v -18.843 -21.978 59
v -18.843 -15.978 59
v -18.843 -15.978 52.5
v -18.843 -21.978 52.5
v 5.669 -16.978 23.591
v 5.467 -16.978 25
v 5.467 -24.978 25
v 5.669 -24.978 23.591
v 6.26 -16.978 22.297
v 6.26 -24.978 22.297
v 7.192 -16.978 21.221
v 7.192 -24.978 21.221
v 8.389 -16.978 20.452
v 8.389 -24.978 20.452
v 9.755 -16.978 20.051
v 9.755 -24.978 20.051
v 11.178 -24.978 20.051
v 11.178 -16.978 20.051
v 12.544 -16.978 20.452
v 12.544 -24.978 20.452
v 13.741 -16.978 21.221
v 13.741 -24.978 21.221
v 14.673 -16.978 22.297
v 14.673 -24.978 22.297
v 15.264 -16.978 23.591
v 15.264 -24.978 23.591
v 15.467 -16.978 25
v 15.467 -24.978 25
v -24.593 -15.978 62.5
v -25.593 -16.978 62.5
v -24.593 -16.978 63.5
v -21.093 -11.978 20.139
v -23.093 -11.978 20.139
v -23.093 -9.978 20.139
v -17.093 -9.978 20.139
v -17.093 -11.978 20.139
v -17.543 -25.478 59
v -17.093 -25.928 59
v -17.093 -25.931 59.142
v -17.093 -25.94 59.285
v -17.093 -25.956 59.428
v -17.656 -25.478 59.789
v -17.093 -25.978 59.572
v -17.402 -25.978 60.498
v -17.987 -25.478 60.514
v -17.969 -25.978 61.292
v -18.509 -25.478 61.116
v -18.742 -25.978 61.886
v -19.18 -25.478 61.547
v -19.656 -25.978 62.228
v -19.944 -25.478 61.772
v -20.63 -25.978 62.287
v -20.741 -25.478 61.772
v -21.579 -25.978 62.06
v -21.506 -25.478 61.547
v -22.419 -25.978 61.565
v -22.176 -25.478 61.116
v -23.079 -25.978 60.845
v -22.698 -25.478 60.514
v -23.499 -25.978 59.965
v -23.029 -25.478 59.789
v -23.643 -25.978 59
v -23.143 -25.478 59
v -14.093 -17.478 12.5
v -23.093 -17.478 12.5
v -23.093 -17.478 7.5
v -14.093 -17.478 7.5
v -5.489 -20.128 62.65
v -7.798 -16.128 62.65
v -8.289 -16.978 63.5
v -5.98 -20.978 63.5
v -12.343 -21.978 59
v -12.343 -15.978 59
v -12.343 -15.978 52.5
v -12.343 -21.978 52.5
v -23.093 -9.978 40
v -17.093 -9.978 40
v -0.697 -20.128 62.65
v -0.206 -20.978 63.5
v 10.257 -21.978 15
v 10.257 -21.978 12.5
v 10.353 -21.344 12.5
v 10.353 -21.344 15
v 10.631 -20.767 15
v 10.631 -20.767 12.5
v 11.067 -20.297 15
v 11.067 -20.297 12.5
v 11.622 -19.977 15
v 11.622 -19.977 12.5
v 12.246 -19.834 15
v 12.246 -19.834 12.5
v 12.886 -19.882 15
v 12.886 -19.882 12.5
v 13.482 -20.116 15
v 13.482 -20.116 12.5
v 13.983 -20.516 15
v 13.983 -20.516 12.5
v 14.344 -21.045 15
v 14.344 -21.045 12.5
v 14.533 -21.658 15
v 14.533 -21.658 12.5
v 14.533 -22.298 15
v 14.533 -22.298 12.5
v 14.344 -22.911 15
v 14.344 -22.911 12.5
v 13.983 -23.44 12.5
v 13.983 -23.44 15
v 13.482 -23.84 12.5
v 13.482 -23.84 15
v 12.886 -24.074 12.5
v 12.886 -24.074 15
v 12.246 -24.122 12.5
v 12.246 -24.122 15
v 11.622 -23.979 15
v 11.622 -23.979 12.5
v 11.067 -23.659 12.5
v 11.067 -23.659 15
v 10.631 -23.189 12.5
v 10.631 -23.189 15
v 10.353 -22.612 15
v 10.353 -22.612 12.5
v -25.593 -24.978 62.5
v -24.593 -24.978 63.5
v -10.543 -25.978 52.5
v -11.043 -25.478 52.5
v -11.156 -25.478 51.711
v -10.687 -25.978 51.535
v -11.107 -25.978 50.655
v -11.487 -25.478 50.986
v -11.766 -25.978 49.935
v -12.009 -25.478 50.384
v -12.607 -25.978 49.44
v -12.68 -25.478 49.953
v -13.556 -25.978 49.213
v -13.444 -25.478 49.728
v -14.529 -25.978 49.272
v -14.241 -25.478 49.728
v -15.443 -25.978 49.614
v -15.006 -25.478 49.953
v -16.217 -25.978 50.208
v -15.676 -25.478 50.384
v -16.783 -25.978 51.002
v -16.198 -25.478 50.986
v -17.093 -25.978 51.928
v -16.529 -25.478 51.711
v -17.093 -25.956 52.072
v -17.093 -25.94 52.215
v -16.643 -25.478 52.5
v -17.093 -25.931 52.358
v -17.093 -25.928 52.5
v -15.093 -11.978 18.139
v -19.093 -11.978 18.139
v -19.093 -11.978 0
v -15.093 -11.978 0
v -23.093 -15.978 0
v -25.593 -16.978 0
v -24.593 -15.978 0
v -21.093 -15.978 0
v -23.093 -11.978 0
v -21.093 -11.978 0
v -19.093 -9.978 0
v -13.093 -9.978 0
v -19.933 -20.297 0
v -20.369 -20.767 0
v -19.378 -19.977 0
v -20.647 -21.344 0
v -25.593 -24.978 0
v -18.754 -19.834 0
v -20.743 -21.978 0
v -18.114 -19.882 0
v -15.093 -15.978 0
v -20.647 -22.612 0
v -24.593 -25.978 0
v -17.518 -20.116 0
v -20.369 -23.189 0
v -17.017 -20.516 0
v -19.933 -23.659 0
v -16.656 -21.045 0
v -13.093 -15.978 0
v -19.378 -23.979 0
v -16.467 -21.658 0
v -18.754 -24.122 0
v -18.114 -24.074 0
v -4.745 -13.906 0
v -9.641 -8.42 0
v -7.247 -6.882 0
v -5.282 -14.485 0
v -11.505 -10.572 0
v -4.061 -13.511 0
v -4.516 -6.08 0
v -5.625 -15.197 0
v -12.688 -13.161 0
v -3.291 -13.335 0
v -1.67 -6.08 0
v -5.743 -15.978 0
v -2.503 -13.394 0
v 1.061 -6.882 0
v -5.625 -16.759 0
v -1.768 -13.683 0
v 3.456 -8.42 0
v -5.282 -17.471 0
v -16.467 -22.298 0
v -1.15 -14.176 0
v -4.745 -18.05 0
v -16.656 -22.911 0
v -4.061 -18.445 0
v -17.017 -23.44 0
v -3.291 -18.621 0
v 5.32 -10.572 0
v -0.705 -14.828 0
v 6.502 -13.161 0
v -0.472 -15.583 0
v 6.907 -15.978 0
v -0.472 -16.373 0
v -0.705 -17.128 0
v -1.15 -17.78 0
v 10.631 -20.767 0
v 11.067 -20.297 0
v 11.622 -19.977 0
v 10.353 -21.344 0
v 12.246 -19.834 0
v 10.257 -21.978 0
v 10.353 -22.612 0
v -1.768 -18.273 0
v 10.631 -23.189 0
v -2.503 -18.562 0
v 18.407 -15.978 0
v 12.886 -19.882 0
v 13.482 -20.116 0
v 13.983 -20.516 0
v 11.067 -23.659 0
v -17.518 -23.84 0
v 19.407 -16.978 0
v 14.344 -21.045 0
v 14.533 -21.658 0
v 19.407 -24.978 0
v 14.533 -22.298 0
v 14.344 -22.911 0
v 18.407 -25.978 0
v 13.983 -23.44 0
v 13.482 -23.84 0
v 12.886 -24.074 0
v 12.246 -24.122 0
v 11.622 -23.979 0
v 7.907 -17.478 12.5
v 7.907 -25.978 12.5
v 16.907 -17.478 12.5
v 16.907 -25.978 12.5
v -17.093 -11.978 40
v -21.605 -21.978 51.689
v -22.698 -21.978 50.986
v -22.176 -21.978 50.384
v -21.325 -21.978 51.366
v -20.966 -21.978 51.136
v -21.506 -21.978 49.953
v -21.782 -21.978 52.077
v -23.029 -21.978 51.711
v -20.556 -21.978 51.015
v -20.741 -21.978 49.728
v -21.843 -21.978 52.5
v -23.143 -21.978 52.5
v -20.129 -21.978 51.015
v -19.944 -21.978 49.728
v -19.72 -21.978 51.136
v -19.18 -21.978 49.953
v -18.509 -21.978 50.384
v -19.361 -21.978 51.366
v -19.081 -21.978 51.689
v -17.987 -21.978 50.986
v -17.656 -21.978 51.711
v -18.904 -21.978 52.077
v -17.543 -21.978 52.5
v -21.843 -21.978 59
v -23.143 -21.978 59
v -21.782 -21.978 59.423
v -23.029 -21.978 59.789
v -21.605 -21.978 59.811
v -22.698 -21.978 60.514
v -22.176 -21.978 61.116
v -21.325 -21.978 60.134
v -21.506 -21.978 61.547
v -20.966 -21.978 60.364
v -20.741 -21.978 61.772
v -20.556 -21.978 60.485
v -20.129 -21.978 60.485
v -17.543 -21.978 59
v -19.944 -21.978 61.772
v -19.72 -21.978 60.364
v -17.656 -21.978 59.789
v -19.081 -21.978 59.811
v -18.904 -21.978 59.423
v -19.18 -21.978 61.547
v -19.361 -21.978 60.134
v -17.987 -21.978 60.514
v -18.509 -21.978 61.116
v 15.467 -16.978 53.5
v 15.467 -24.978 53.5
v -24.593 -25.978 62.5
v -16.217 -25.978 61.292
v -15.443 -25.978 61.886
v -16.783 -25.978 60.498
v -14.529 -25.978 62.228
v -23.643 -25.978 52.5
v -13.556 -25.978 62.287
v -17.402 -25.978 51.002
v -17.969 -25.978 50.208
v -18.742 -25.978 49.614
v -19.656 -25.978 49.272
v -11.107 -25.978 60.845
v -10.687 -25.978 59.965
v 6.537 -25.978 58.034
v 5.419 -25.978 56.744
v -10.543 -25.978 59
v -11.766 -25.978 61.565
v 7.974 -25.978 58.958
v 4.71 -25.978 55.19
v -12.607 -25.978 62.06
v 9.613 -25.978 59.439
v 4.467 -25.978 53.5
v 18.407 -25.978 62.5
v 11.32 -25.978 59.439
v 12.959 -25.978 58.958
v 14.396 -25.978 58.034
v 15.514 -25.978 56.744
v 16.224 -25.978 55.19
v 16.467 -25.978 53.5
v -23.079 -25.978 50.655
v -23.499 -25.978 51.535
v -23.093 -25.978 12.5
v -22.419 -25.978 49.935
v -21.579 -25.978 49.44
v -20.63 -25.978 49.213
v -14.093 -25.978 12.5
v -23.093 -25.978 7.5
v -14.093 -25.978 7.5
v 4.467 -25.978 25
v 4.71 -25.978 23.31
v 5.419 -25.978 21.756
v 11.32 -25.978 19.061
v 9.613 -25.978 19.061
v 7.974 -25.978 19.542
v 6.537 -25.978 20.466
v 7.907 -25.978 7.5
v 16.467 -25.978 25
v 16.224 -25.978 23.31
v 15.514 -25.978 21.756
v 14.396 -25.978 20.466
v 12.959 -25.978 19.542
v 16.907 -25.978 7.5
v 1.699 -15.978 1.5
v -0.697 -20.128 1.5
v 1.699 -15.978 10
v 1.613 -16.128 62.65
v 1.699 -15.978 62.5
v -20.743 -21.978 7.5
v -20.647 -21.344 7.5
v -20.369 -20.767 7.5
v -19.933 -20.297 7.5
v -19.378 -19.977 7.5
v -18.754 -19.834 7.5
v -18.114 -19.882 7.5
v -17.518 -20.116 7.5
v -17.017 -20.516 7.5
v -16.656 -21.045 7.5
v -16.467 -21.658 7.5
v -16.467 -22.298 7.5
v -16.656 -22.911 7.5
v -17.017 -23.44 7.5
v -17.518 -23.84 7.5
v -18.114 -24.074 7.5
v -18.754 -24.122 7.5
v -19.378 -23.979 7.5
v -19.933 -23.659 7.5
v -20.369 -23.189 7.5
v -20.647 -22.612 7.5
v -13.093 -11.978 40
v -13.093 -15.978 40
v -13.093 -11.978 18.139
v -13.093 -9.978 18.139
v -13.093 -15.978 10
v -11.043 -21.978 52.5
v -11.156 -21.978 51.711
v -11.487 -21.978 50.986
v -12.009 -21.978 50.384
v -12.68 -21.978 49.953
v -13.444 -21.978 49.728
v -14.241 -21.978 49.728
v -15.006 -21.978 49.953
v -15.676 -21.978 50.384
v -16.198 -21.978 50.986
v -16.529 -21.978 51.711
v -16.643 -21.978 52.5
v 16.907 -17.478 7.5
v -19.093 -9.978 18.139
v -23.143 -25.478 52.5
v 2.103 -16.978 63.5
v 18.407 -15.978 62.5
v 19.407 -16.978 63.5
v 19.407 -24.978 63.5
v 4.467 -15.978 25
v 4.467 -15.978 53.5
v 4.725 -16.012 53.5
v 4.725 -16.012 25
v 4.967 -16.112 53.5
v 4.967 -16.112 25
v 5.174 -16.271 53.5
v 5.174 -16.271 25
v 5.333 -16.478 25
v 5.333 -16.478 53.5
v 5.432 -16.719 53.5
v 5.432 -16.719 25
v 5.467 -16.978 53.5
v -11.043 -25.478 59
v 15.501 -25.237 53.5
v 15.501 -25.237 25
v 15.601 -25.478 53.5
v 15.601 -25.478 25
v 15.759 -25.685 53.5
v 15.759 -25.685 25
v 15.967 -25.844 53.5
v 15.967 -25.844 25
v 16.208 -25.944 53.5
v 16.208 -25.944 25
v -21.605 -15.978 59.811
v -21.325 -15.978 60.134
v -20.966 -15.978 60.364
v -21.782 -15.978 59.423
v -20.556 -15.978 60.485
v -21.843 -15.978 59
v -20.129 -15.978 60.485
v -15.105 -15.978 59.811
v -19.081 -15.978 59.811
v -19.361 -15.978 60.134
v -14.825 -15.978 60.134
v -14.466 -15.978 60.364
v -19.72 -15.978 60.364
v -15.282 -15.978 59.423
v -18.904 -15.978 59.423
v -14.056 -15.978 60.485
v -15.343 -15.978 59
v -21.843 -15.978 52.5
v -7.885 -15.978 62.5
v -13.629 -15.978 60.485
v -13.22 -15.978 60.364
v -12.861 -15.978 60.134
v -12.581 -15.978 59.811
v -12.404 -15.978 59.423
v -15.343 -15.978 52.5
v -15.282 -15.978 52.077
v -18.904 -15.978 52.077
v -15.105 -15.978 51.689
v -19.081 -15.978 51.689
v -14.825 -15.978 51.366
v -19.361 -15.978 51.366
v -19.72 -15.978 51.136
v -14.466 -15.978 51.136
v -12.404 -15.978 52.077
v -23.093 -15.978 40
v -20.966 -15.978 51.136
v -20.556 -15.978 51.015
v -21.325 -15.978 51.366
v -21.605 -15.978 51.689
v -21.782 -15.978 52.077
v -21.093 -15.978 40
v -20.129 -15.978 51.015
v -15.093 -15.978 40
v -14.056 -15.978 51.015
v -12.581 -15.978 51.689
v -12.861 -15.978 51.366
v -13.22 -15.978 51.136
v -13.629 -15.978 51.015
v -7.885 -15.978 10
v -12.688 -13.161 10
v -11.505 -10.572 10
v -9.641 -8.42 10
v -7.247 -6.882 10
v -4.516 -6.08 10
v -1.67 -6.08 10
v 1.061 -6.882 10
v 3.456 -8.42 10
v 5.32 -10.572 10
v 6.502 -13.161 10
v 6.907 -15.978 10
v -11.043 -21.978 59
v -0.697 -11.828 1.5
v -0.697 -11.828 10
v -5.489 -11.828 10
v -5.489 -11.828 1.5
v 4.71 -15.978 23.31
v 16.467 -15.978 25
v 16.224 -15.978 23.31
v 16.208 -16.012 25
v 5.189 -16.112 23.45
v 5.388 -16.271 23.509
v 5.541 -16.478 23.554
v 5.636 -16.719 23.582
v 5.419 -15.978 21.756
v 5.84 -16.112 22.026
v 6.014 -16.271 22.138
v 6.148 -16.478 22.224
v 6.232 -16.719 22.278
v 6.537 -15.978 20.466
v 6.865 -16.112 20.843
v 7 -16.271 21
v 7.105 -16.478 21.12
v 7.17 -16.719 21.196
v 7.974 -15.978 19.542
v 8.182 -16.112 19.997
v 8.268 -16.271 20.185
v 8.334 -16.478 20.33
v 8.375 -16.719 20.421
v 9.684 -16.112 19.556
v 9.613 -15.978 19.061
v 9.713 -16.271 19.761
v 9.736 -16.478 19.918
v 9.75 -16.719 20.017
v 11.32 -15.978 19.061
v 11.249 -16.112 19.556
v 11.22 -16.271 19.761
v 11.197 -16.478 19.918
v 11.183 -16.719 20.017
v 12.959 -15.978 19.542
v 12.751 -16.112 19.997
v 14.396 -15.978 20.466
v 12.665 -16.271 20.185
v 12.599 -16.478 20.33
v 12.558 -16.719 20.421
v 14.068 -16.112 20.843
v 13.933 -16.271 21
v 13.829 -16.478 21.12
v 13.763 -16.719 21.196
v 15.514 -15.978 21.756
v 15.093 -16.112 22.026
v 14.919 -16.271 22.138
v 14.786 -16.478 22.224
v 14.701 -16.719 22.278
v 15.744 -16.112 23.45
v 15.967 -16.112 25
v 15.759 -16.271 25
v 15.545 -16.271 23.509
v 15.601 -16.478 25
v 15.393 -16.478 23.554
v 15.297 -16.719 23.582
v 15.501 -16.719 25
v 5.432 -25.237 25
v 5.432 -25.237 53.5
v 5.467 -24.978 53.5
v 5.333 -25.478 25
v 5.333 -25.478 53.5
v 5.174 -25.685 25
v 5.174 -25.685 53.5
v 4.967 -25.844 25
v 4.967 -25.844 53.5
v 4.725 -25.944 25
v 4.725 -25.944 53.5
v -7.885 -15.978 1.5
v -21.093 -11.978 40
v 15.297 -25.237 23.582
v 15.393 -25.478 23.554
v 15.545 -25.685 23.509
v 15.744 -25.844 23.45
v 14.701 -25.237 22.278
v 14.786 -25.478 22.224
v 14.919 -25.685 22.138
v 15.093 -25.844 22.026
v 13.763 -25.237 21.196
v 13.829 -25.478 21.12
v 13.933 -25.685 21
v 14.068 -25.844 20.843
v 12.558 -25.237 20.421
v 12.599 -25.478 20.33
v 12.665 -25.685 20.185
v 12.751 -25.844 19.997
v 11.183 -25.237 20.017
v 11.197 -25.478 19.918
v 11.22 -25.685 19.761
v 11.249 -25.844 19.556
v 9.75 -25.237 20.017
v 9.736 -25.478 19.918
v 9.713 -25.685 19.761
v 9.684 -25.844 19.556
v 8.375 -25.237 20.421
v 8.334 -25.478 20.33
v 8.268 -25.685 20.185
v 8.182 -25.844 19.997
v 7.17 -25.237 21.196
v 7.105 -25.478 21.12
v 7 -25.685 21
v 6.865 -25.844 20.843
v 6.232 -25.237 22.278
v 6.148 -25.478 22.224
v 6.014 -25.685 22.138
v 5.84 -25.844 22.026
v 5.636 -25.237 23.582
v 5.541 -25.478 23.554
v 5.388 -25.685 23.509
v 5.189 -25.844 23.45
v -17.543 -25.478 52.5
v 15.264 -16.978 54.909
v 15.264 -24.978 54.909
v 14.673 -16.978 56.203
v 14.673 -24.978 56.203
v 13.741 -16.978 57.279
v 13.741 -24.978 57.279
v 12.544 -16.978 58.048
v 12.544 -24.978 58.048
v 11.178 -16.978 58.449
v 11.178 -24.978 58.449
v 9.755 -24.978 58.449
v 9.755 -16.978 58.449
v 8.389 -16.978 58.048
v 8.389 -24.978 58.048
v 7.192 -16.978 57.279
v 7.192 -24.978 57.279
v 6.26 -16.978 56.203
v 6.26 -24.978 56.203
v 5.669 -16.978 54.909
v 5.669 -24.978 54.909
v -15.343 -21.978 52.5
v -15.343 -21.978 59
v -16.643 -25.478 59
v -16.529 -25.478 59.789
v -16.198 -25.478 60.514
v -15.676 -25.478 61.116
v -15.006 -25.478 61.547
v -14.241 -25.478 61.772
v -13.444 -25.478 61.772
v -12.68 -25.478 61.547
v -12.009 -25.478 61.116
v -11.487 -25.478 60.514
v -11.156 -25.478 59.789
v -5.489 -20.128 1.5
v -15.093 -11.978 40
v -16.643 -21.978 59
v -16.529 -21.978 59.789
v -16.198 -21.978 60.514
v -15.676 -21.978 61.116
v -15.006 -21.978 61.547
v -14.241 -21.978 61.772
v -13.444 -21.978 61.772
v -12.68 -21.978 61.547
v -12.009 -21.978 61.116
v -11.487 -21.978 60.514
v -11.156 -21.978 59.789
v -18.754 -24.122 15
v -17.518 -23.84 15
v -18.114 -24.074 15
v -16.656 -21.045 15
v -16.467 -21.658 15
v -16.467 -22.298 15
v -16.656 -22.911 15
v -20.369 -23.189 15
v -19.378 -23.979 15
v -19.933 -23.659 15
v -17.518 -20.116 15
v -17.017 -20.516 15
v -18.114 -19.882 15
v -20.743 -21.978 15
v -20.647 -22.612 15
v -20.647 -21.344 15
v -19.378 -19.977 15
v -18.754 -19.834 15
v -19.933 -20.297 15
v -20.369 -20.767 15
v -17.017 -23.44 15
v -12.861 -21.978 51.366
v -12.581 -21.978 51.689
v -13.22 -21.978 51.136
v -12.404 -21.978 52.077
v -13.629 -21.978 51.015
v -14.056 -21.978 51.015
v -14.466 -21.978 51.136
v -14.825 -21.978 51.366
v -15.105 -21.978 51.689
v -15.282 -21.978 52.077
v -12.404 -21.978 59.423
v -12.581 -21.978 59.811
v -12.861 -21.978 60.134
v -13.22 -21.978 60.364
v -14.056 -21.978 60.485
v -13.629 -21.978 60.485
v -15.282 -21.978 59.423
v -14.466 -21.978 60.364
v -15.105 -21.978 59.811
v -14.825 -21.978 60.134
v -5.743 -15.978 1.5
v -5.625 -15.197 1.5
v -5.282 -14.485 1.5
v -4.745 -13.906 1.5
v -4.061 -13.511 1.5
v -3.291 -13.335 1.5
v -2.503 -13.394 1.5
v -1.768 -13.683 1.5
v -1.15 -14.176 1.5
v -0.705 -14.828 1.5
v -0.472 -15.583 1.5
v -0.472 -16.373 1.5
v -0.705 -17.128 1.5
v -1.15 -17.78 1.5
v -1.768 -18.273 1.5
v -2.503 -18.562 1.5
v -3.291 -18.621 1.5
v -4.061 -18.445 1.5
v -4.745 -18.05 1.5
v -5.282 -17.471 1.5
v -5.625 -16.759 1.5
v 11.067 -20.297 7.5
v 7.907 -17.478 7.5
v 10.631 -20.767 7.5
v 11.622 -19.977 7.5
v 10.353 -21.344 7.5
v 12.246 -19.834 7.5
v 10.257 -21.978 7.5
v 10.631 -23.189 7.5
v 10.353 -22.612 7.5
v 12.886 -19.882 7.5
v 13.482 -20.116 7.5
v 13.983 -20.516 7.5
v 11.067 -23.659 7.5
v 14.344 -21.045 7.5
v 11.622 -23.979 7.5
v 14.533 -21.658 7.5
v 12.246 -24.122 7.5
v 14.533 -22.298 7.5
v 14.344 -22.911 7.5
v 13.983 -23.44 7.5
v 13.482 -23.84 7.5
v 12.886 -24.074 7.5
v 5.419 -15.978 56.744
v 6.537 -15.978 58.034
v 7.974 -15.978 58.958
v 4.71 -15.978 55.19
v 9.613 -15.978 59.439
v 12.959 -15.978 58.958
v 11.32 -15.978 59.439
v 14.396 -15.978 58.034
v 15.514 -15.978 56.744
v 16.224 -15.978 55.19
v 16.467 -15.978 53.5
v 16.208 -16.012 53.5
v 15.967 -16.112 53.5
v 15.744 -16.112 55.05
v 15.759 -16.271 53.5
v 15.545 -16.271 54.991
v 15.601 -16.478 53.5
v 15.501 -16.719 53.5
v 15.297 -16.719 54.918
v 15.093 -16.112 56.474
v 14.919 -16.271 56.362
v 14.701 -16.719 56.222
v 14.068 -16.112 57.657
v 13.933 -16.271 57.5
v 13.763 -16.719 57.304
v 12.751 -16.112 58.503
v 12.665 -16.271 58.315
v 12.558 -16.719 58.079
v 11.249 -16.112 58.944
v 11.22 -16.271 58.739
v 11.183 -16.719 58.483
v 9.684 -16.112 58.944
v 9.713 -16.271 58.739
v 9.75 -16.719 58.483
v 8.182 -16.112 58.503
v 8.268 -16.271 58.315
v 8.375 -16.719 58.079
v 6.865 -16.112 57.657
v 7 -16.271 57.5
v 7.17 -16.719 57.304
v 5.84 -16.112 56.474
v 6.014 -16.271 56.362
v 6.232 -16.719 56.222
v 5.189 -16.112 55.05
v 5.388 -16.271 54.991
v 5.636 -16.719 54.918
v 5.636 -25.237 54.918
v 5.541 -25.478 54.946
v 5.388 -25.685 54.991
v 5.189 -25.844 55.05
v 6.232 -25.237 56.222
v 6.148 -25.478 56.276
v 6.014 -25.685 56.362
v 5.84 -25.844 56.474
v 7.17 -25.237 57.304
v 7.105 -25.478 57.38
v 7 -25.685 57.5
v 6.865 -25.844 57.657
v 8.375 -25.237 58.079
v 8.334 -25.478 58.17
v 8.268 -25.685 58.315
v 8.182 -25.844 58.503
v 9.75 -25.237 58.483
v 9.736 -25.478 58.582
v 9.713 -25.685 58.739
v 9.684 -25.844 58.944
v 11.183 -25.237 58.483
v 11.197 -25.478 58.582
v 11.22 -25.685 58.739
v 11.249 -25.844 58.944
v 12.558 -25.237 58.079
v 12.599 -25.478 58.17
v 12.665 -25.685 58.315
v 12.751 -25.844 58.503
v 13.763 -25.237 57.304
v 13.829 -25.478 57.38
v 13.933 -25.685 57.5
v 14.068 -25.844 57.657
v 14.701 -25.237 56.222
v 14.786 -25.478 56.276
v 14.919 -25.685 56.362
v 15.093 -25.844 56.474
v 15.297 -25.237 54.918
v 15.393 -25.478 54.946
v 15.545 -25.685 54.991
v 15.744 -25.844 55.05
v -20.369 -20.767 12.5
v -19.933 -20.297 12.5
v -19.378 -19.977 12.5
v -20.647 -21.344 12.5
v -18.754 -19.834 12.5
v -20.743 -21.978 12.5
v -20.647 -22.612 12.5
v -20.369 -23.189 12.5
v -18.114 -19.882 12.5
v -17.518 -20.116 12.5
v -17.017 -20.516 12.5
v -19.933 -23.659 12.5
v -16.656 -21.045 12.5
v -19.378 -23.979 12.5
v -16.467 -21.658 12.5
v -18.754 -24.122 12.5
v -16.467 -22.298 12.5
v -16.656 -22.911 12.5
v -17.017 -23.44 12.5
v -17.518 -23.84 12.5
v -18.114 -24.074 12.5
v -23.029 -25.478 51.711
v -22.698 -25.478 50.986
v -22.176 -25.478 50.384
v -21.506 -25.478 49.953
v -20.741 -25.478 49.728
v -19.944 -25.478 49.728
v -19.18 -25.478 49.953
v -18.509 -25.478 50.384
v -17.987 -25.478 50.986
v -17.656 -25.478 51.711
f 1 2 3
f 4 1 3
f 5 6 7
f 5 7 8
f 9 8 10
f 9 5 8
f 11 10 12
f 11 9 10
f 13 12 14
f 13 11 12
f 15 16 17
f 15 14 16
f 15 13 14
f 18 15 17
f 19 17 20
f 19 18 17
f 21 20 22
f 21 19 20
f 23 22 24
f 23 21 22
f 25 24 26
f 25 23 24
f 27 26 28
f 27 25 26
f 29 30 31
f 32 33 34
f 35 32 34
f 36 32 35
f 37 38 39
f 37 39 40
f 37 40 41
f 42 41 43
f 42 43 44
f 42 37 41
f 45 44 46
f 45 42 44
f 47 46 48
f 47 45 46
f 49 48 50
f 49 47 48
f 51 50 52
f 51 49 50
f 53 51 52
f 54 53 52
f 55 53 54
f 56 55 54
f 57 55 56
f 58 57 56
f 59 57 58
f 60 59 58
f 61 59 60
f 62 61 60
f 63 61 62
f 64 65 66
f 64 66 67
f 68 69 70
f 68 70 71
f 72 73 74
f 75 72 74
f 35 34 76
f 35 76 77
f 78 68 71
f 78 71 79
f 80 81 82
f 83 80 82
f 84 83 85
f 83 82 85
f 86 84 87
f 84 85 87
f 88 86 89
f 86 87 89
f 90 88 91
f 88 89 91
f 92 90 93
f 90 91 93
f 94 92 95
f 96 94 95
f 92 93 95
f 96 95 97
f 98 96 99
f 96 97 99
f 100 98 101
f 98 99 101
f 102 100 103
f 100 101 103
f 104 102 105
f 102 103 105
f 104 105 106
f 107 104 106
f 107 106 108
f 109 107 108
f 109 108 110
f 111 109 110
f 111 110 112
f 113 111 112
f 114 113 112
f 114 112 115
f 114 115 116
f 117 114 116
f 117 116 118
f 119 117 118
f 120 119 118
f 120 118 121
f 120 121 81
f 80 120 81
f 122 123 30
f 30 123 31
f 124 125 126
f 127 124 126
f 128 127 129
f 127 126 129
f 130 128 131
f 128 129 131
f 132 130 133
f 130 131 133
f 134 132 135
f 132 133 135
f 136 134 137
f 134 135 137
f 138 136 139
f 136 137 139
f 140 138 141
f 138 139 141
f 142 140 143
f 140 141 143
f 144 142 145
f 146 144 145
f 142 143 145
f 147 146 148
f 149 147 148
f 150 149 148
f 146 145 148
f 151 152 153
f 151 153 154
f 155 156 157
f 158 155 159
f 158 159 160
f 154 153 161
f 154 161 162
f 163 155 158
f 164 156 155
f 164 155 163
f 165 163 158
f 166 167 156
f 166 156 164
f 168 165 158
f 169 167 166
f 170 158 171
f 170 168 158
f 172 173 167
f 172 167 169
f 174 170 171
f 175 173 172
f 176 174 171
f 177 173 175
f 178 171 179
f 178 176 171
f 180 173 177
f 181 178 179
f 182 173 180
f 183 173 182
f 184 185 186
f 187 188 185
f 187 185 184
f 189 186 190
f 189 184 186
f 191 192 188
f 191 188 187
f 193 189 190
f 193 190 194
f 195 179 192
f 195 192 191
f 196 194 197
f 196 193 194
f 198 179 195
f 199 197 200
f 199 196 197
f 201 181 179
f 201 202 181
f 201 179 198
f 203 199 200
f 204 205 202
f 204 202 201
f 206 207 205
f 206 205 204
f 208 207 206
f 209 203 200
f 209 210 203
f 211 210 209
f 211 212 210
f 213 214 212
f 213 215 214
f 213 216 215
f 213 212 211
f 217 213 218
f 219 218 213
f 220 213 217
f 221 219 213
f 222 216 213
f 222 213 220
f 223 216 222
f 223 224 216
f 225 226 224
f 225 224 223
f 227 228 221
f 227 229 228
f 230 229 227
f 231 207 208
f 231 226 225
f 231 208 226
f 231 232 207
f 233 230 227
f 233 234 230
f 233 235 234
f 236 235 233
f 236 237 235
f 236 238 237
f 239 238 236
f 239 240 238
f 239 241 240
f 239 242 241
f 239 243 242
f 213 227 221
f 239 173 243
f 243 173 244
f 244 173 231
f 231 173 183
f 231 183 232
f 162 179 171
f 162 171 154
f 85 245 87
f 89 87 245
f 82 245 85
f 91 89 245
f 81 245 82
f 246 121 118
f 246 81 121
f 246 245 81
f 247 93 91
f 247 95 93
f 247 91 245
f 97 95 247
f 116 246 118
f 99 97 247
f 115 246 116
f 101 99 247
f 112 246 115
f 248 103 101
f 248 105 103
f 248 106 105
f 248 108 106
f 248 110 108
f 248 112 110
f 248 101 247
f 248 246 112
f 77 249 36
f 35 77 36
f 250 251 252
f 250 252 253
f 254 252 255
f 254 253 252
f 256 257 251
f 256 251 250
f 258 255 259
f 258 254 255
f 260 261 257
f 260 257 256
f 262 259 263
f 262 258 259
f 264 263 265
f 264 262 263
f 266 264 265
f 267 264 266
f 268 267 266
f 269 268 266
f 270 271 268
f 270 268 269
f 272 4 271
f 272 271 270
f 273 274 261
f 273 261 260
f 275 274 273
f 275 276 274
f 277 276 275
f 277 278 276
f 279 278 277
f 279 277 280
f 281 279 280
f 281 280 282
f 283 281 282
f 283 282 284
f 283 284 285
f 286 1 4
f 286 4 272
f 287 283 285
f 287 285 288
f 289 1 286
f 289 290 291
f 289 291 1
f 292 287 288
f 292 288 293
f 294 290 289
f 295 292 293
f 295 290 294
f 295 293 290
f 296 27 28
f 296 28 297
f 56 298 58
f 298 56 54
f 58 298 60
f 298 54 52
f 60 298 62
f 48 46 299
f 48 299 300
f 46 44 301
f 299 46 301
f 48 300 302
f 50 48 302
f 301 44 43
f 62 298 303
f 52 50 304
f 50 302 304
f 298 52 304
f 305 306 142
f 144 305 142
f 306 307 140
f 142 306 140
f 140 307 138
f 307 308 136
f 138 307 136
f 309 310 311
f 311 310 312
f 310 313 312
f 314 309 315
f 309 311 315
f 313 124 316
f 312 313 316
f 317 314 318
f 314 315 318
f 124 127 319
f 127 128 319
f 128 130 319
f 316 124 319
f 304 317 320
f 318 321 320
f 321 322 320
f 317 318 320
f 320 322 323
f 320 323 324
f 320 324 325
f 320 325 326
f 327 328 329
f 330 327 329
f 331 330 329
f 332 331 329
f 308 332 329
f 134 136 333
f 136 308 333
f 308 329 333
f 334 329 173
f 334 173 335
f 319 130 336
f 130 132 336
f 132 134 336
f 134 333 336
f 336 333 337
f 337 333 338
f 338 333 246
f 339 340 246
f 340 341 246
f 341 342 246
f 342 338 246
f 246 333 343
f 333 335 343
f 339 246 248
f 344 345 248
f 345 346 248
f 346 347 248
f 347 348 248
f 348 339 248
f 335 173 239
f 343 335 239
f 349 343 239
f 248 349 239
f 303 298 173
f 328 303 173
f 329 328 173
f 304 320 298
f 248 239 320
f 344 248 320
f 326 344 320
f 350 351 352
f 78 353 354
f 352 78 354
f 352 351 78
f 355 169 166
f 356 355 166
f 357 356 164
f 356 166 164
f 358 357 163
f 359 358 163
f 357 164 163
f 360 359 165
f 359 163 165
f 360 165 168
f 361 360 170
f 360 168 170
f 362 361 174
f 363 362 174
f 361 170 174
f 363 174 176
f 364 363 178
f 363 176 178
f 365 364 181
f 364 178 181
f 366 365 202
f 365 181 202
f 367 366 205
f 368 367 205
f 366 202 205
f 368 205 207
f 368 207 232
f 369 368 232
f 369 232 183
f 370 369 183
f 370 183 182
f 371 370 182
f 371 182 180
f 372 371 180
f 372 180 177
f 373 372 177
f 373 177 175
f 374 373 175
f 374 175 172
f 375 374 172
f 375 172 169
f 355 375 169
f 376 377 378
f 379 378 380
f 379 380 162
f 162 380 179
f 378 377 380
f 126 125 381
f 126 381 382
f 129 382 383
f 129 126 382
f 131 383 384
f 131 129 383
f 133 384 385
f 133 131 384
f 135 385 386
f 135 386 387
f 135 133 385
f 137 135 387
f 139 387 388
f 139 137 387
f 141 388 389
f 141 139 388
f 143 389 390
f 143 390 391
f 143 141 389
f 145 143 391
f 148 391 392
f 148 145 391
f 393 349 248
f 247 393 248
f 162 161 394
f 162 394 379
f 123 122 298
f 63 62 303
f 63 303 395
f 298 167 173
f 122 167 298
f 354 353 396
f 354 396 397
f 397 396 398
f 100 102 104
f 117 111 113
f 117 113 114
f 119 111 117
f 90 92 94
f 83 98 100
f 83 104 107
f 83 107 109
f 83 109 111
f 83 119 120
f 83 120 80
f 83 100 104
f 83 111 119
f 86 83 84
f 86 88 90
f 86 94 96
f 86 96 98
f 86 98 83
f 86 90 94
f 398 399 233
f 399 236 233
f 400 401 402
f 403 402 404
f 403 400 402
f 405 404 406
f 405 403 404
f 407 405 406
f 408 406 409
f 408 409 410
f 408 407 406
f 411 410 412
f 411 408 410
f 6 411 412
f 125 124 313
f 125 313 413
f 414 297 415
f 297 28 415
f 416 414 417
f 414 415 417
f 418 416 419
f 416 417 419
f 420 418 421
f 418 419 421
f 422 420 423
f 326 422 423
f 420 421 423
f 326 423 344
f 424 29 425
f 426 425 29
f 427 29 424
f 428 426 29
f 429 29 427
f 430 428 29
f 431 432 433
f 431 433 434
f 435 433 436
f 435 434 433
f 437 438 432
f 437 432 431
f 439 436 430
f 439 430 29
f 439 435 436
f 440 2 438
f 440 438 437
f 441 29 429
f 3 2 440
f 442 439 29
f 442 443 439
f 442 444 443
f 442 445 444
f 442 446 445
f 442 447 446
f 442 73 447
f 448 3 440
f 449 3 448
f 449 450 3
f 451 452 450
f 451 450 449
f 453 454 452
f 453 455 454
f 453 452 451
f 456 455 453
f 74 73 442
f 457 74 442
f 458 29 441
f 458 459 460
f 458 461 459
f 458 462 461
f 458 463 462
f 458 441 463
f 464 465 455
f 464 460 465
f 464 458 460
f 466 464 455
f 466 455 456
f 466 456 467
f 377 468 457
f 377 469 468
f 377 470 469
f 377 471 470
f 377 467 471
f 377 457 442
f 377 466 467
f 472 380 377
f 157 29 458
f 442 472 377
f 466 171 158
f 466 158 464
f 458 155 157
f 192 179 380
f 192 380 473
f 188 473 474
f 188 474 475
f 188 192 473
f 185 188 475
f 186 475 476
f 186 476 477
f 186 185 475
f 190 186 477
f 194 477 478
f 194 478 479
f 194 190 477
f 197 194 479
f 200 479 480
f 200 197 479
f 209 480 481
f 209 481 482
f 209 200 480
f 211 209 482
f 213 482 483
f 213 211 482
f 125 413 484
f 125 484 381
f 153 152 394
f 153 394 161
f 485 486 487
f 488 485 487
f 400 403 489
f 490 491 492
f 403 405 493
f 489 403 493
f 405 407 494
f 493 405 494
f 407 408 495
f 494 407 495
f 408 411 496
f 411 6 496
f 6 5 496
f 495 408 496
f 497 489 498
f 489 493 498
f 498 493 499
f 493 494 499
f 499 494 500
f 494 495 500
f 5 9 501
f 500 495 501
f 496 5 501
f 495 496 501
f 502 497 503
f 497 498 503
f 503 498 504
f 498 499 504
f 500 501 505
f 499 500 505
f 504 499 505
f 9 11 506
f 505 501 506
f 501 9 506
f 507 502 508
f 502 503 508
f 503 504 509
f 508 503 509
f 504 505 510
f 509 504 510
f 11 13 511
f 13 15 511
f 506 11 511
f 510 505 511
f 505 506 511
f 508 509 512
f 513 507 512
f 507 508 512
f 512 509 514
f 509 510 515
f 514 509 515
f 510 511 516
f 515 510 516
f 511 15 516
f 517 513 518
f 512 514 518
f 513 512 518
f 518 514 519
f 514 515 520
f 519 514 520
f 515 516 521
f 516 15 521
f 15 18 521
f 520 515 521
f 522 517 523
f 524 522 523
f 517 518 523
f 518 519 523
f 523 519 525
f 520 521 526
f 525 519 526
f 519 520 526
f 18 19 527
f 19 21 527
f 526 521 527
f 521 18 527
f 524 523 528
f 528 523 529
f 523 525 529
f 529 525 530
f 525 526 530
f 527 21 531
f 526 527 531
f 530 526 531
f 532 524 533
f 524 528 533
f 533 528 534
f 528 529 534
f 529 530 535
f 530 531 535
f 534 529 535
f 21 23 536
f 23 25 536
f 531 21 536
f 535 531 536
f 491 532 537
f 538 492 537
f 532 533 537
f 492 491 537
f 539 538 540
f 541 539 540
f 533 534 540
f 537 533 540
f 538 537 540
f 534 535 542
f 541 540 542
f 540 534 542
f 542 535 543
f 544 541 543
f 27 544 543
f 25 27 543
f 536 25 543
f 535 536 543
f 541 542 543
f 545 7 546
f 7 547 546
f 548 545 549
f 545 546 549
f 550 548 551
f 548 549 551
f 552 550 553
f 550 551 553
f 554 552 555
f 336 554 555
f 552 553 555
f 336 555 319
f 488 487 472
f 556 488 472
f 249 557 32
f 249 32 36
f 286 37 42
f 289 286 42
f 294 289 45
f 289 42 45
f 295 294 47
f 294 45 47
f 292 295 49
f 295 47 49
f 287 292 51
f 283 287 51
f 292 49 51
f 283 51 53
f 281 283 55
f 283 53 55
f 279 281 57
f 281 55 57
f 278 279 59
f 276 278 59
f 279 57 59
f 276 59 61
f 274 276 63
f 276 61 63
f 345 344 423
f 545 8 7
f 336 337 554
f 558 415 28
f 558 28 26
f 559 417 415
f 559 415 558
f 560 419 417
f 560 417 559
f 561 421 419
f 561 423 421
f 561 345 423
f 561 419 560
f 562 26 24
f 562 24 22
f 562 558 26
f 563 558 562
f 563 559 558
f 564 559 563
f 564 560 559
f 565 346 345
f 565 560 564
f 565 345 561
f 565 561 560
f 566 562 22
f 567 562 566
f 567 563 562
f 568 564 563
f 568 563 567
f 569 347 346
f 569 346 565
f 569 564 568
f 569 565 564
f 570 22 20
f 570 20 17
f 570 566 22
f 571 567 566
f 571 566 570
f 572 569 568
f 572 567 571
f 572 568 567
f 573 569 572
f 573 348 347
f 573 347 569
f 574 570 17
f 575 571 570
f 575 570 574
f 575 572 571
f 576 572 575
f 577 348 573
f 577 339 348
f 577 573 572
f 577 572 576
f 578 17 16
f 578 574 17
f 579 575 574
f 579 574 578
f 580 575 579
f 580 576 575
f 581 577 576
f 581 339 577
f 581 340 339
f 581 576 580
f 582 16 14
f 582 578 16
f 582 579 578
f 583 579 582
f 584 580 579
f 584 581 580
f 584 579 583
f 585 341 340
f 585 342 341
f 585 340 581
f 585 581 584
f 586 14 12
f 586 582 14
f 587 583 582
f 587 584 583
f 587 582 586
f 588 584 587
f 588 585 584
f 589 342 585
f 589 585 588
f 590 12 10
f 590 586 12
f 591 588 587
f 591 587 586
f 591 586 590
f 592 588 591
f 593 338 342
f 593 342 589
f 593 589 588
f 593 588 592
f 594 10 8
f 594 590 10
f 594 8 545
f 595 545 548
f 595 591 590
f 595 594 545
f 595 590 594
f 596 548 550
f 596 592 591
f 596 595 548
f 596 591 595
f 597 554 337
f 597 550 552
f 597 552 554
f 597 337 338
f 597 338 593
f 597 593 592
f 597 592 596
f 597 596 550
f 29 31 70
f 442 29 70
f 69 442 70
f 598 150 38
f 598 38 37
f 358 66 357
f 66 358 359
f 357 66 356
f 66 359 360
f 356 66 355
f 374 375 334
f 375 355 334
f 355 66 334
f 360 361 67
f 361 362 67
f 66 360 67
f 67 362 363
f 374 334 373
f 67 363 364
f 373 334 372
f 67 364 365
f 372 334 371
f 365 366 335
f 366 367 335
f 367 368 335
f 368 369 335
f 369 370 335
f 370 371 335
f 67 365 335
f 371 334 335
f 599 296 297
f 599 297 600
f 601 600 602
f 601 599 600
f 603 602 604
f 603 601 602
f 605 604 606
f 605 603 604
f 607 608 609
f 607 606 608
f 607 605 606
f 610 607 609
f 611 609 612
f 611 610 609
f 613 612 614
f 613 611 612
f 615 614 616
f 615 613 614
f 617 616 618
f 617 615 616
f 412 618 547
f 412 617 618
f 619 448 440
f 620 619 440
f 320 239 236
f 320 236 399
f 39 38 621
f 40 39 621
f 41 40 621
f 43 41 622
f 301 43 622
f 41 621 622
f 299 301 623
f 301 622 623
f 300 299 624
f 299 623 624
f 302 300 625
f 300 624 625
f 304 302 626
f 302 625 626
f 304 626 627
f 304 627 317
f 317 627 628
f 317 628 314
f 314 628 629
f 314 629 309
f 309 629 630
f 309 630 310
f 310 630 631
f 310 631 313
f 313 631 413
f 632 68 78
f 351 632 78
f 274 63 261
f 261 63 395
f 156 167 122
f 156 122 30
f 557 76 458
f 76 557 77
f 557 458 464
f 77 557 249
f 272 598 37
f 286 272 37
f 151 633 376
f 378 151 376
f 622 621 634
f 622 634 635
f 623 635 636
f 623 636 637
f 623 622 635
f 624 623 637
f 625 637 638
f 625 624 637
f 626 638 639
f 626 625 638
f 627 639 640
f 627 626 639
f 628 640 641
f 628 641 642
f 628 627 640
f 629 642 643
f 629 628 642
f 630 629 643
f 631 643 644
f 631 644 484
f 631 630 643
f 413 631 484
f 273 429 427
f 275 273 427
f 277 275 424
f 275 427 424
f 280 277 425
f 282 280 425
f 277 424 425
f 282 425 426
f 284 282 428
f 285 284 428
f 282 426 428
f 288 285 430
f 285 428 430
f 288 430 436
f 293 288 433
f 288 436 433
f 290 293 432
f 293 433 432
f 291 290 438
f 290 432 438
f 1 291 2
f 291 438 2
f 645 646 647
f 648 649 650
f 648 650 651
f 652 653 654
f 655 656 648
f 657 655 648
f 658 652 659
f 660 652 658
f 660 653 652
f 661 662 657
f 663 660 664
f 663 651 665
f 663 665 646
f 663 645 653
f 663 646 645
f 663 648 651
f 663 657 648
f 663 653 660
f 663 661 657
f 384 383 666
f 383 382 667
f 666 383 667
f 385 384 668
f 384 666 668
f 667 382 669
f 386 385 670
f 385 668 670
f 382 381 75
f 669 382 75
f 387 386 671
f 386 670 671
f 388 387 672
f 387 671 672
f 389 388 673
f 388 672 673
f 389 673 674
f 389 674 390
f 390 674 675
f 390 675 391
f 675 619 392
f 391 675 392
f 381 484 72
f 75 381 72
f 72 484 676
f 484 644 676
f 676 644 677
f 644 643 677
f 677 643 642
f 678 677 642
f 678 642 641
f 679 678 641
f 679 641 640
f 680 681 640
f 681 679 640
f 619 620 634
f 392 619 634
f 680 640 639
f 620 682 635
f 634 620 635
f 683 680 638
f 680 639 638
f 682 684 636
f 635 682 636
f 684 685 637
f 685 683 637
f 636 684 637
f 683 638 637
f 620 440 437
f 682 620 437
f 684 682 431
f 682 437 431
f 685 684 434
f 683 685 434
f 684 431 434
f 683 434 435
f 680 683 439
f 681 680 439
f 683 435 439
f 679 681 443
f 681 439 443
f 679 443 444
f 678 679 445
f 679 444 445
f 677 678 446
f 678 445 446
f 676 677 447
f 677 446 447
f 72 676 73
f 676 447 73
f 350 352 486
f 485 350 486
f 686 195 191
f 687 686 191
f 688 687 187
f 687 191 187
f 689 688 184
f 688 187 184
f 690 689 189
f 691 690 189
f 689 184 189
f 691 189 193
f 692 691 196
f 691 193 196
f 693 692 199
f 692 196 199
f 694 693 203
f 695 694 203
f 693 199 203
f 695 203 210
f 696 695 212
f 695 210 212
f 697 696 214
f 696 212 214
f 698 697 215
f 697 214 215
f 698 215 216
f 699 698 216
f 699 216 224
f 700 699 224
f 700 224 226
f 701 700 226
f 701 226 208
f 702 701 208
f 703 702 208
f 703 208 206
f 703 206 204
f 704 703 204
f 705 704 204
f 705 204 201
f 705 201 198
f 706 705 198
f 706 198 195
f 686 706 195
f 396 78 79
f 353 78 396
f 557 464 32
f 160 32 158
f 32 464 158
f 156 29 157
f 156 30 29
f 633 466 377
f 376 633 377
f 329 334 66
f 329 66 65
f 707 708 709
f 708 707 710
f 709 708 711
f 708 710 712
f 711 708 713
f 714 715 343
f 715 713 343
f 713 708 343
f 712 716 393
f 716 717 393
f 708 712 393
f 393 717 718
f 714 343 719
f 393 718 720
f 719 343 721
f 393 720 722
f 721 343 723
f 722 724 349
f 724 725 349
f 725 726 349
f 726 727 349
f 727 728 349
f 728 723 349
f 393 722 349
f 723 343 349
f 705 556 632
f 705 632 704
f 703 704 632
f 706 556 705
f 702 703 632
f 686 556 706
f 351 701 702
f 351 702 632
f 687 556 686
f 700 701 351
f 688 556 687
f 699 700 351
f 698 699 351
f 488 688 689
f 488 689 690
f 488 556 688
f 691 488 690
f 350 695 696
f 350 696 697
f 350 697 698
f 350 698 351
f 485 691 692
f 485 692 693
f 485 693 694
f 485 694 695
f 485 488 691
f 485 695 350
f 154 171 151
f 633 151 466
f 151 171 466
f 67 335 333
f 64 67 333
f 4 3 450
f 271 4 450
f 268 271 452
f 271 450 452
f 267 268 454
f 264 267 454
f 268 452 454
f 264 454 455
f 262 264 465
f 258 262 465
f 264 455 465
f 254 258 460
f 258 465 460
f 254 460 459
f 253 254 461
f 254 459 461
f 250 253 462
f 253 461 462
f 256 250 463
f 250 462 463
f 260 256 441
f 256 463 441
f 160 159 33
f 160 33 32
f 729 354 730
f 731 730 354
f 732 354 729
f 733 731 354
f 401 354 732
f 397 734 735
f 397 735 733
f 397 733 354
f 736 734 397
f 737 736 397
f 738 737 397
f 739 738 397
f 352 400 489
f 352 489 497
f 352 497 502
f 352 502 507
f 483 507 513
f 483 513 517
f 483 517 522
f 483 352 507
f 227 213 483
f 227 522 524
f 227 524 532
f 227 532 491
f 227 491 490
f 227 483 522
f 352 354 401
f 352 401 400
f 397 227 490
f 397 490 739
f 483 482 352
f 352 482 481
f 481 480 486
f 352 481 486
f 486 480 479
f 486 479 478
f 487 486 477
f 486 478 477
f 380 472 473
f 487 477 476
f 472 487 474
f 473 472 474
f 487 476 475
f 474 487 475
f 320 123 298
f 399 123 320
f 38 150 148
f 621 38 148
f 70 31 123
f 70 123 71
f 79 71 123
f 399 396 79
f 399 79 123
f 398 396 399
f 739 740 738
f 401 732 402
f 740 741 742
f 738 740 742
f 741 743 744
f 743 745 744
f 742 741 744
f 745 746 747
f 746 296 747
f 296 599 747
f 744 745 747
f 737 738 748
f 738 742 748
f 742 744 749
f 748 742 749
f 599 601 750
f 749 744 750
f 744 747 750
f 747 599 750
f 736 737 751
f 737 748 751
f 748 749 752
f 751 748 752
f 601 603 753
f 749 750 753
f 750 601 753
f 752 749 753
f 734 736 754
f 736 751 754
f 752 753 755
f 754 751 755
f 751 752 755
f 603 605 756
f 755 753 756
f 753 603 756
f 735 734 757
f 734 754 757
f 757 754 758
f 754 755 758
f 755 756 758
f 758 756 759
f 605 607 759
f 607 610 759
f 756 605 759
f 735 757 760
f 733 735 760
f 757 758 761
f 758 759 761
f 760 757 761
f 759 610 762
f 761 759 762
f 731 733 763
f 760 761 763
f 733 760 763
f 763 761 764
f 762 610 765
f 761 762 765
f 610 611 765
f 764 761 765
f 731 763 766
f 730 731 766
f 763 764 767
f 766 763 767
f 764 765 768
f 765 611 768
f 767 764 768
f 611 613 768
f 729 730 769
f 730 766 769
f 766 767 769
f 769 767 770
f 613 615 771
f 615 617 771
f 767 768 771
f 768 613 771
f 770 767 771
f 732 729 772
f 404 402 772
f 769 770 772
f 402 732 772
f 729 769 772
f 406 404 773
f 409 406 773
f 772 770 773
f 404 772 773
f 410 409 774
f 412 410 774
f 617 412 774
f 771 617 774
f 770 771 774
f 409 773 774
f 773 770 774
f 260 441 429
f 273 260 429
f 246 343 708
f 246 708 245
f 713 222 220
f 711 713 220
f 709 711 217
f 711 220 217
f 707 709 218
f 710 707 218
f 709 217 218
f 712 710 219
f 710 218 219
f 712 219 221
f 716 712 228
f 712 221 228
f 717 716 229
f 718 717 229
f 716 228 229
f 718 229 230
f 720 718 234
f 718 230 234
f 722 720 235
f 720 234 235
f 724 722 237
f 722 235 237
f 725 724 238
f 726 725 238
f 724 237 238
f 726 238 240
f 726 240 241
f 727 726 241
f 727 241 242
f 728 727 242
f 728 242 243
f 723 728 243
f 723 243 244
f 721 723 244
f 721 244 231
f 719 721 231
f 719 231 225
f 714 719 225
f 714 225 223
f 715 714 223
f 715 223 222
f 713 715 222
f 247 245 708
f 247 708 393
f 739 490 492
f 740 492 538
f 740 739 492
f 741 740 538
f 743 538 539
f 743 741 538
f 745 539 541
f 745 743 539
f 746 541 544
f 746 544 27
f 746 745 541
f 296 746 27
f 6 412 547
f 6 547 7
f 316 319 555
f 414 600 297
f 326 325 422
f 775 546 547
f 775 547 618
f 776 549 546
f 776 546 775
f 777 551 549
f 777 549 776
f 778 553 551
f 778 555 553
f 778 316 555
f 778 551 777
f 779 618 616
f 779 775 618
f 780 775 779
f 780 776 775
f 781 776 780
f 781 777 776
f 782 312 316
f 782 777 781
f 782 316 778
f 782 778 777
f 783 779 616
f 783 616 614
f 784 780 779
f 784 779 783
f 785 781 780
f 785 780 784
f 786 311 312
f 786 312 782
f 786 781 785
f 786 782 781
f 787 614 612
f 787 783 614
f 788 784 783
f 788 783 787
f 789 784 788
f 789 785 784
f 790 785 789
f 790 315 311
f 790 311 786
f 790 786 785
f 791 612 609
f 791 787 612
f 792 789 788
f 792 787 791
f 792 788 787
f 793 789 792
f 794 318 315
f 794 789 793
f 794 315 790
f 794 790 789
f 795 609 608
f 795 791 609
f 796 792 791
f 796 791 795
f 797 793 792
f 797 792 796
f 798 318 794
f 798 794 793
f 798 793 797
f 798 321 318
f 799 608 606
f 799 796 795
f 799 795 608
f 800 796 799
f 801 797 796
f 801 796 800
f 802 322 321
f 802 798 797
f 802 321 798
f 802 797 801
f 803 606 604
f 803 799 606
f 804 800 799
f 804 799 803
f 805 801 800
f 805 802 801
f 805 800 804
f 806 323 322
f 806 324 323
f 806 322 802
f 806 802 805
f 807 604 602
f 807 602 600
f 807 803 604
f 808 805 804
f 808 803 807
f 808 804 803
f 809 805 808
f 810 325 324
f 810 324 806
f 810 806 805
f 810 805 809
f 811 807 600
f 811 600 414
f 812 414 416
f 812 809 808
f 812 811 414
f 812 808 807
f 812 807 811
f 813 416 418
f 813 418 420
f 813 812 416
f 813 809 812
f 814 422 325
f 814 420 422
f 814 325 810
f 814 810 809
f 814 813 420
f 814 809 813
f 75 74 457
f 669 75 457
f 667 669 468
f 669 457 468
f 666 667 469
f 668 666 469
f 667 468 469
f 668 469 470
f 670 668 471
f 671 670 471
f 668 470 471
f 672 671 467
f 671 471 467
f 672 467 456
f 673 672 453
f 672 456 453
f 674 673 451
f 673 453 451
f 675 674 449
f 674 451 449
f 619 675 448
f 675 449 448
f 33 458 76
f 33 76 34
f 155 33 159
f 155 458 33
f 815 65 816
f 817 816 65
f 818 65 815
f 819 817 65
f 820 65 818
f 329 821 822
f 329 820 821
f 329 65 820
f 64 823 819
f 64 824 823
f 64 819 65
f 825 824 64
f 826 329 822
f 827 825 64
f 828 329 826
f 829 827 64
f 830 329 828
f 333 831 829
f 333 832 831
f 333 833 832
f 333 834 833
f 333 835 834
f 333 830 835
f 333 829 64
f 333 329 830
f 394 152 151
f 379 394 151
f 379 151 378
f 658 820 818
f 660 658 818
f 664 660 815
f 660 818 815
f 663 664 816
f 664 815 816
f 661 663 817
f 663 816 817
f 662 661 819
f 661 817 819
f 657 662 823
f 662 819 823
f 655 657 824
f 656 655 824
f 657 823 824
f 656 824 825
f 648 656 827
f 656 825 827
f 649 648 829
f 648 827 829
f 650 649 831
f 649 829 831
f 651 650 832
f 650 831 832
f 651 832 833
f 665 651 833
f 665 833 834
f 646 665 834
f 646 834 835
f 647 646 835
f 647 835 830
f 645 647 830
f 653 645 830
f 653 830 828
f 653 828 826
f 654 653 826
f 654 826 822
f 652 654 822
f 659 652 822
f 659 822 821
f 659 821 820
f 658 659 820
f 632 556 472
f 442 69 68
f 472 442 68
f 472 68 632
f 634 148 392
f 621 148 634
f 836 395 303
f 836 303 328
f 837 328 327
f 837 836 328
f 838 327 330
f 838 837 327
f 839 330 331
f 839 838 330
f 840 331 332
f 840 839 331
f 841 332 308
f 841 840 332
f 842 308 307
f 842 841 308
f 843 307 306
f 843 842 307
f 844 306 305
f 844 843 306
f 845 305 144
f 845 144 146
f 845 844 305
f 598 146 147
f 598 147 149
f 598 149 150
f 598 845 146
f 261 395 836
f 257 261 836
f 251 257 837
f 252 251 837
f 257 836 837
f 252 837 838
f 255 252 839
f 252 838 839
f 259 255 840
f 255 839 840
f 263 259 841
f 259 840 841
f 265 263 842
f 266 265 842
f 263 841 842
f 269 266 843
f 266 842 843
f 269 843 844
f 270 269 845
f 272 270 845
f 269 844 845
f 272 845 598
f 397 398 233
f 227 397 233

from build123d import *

# Parameters (mm, degrees)
SKETCH_2_R           = 2.5
EXTRUDE_4_DEPTH      = 10
SKETCH_3_W           = 45
SKETCH_3_H           = 10
EXTRUDE_5_DEPTH      = 53.5
CUT_EXTRUDE_2_DEPTH  = 62
SKETCH_5_W           = 2
SKETCH_5_H           = 40
EXTRUDE_6_DEPTH      = 4
SKETCH_6_W           = 6
SKETCH_6_H           = 18.13920413
SKETCH_6_H_2         = 19.86079587
EXTRUDE_7_DEPTH      = 2
SKETCH_8_R           = 2
CUT_EXTRUDE_3_DEPTH  = 15
SKETCH_9_W           = 4
SKETCH_9_H           = 2
CUT_EXTRUDE_4_DEPTH  = 8
CUT_EXTRUDE_6_DEPTH  = 70.189906512
CUT_EXTRUDE_7_DEPTH  = 70.189906512
CUT_EXTRUDE_8_DEPTH  = 4
CHAMFER_1_SIZE       = 0.5
CHAMFER_2_SIZE       = 1
FILLET_1_R           = 1
FILLET_2_R           = 1
SKETCH_13_R          = 2.65
CUT_EXTRUDE_9_DEPTH  = 74.226354795
CUT_EXTRUDE_10_DEPTH = 62
SKETCH_15_R          = 2.15
CUT_EXTRUDE_11_DEPTH = 15
SKETCH_16_W          = 9
SKETCH_16_H          = 5
CUT_EXTRUDE_12_DEPTH = 8.5


with BuildPart() as part:
    # Эскиз2 → Бобышка-Вытянуть4 (new body)
    with BuildSketch(Plane.XY):
        with BuildLine():
            Line((-25.592834214, -15.977988248), (-13.092834214, -15.977988248))
            ThreePointArc((-13.092834214, -15.977988248), (-3.092834214, -5.977988248), (6.907165786, -15.977988248))
            Line((6.907165786, -15.977988248), (19.407165786, -15.977988248))
            Line((19.407165786, -15.977988248), (19.407165786, -25.977988248))
            Line((19.407165786, -25.977988248), (-25.592834214, -25.977988248))
            Line((-25.592834214, -25.977988248), (-25.592834214, -15.977988248))
        make_face()
        with Locations((-3.092834214, -15.977988248)):
            Circle(SKETCH_2_R, mode=Mode.SUBTRACT)
    extrude(amount=EXTRUDE_4_DEPTH)

    # Эскиз3 → Бобышка-Вытянуть5 (add)
    with BuildSketch(Plane.XY.offset(10)):
        with Locations((-3.092834214, -20.977988248)):
            Rectangle(SKETCH_3_W, SKETCH_3_H)
    extrude(amount=EXTRUDE_5_DEPTH)

    # Эскиз4 → Вырез-Вытянуть2 (cut)
    with BuildSketch(Plane.XY.offset(63.5)):
        Polygon((-0.783433137, -19.977988248), (1.52596794, -15.977988248), (-0.783433137, -11.977988248), (-5.40223529, -11.977988248), (-7.711636367, -15.977988248), (-5.40223529, -19.977988248), align=None)
    extrude(amount=-CUT_EXTRUDE_2_DEPTH, mode=Mode.SUBTRACT)

    # Эскиз5 → Бобышка-Вытянуть6 (add)
    with BuildSketch(Plane(origin=(0, -15.977988248, 0), x_dir=(1, 0, 0), z_dir=(0, 1, 0))):
        with Locations((-22.092834214, -20)):
            Rectangle(SKETCH_5_W, SKETCH_5_H)
        Polygon((-13.092834214, 0), (-15.092834214, 0), (-15.092834214, -40), (-13.092834214, -40), (-13.092834214, -10), align=None)
    extrude(amount=EXTRUDE_6_DEPTH)

    # Эскиз6 → Бобышка-Вытянуть7 (add)
    with BuildSketch(Plane(origin=(0, -11.977988248, 0), x_dir=(1, 0, 0), z_dir=(0, 1, 0))):
        with Locations((-16.092834214, -9.069602065)):
            Rectangle(SKETCH_6_W, SKETCH_6_H)
        with Locations((-20.092834214, -30.069602065)):
            Rectangle(SKETCH_6_W, SKETCH_6_H_2)
    extrude(amount=EXTRUDE_7_DEPTH)

    # Эскиз8 → Вырез-Вытянуть3 (cut)
    with BuildSketch(Plane(origin=(0, 0, 0), x_dir=(-1, 0, 0), z_dir=(0, 0, -1))):
        with Locations((-12.407165786, -21.977988248)):
            Circle(SKETCH_8_R)
        with Locations((18.592834214, -21.977988248)):
            Circle(SKETCH_8_R)
    extrude(amount=-CUT_EXTRUDE_3_DEPTH, mode=Mode.SUBTRACT)

    # Эскиз9 → Вырез-Вытянуть4 (cut)
    with BuildSketch(Plane.XZ.offset(25.977988248)):
        Polygon((12.407165786, 8), (12.407165786, 10), (12.407165786, 12), (8.407165786, 12), (8.407165786, 8), align=None)
        with Locations((14.407165786, 9)):
            Rectangle(SKETCH_9_W, SKETCH_9_H)
        with Locations((14.407165786, 11)):
            Rectangle(SKETCH_9_W, SKETCH_9_H)
        Polygon((-18.592834214, 12), (-14.592834214, 12), (-14.592834214, 8), (-22.592834214, 8), (-22.592834214, 12), align=None)
    extrude(amount=-CUT_EXTRUDE_4_DEPTH, mode=Mode.SUBTRACT)

    # Эскиз10 → Вырез-Вытянуть6 (cut, through all)
    with BuildSketch(Plane(origin=(0, -15.977988248, 0), x_dir=(1, 0, 0), z_dir=(0, 1, 0))):
        with BuildLine():
            Line((5.466566863, -53.5), (5.466566863, -25))
            ThreePointArc((5.466566863, -25), (10.466566863, -20), (15.466566863, -25))
            Line((15.466566863, -25), (15.466566863, -53.5))
            ThreePointArc((15.466566863, -53.5), (10.466566863, -58.5), (5.466566863, -53.5))
        make_face()
    extrude(amount=-CUT_EXTRUDE_6_DEPTH, mode=Mode.SUBTRACT)

    # Эскиз11 → Вырез-Вытянуть7 (cut, through all)
    with BuildSketch(Plane(origin=(0, -15.977988248, 0), x_dir=(1, 0, 0), z_dir=(0, 1, 0))):
        with BuildLine():
            Line((-21.842834214, -52.5), (-21.842834214, -59))
            ThreePointArc((-21.842834214, -59), (-20.342834214, -60.5), (-18.842834214, -59))
            Line((-18.842834214, -59), (-18.842834214, -52.5))
            ThreePointArc((-18.842834214, -52.5), (-20.342834214, -51), (-21.842834214, -52.5))
        make_face()
        with BuildLine():
            Line((-15.342834214, -52.5), (-15.342834214, -59))
            ThreePointArc((-15.342834214, -59), (-13.842834214, -60.5), (-12.342834214, -59))
            Line((-12.342834214, -59), (-12.342834214, -52.5))
            ThreePointArc((-12.342834214, -52.5), (-13.842834214, -51), (-15.342834214, -52.5))
        make_face()
    extrude(amount=-CUT_EXTRUDE_7_DEPTH, mode=Mode.SUBTRACT)

    # Эскиз12 → Вырез-Вытянуть8 (cut)
    with BuildSketch(Plane.XZ.offset(25.977988248)):
        with BuildLine():
            Line((-23.142834214, 59), (-23.142834214, 52.5))
            ThreePointArc((-23.142834214, 52.5), (-20.342834214, 49.7), (-17.542834214, 52.5))
            Line((-17.542834214, 52.5), (-17.542834214, 59))
            ThreePointArc((-17.542834214, 59), (-20.342834214, 61.8), (-23.142834214, 59))
        make_face()
        with BuildLine():
            Line((-16.642834214, 52.5), (-16.642834214, 59))
            ThreePointArc((-16.642834214, 59), (-13.842834214, 61.8), (-11.042834214, 59))
            Line((-11.042834214, 59), (-11.042834214, 52.5))
            ThreePointArc((-11.042834214, 52.5), (-13.842834214, 49.7), (-16.642834214, 52.5))
        make_face()
    extrude(amount=-CUT_EXTRUDE_8_DEPTH, mode=Mode.SUBTRACT)

    # Фаска1
    # the kernel refuses this chamfer: 0.5 mm, written as the material it takes off along each edge
    with BuildSketch(Plane(origin=(-20.342834214, -25.977988248, 59), x_dir=(1, 0, 0), z_dir=(0, 0, -1))) as chamfer_1_piece_1:
        Polygon((2.8 + CHAMFER_1_SIZE, 0), (2.8, -CHAMFER_1_SIZE), (2.8, 0), align=None)
    revolve(axis=Axis((-20.342834214, -25.977988248, 59), (0, -1, 0)), revolution_arc=180, mode=Mode.SUBTRACT)
    with BuildSketch(Plane(origin=(-23.142834214, -25.977988248, 59), x_dir=(-0.9996219169112968, -0.027495876610589005, 0), z_dir=(0, 0, -1)), Plane(origin=(-17.542834214, -25.977988248, 52.5), x_dir=(0.9996219169112968, -0.027495876610589196, 0), z_dir=(0, 0, 1))) as chamfer_1_piece_2:
        Polygon((CHAMFER_1_SIZE * 0.999621916911, CHAMFER_1_SIZE * 0.0274958766106), (-CHAMFER_1_SIZE * 0.0274958766106, CHAMFER_1_SIZE * 0.999621916911), (0, 0), align=None)
    extrude(amount=6.5, mode=Mode.SUBTRACT)
    with BuildSketch(Plane(origin=(-20.342834214, -25.977988248, 52.5), x_dir=(-1, 0, 0), z_dir=(0, 0, 1))) as chamfer_1_piece_3:
        Polygon((2.8 + CHAMFER_1_SIZE, 0), (2.8, -CHAMFER_1_SIZE), (2.8, 0), align=None)
    revolve(axis=Axis((-20.342834214, -25.977988248, 52.5), (0, -1, 0)), revolution_arc=180, mode=Mode.SUBTRACT)
    with BuildSketch(Plane(origin=(-13.842834214, -25.977988248, 52.5), x_dir=(1, 0, 0), z_dir=(0, 0, 1))) as chamfer_1_piece_4:
        Polygon((2.8 + CHAMFER_1_SIZE, 0), (2.8, CHAMFER_1_SIZE), (2.8, 0), align=None)
    revolve(axis=Axis((-13.842834214, -25.977988248, 52.5), (0, 1, 0)), revolution_arc=180, mode=Mode.SUBTRACT)
    with BuildSketch(Plane(origin=(-11.042834214, -25.977988248, 59), x_dir=(0.9996219169112968, -0.0274958766105891, 0), z_dir=(0, 0, -1)), Plane(origin=(-16.642834214, -25.977988248, 52.5), x_dir=(-0.9996219169112968, -0.027495876610589005, 0), z_dir=(0, 0, 1))) as chamfer_1_piece_5:
        Polygon((CHAMFER_1_SIZE * 0.999621916911, -CHAMFER_1_SIZE * 0.0274958766106), (-CHAMFER_1_SIZE * 0.0274958766106, -CHAMFER_1_SIZE * 0.999621916911), (0, 0), align=None)
    extrude(amount=6.5, mode=Mode.SUBTRACT)
    with BuildSketch(Plane(origin=(-13.842834214, -25.977988248, 59), x_dir=(-1, 0, 0), z_dir=(0, 0, -1))) as chamfer_1_piece_6:
        Polygon((2.8 + CHAMFER_1_SIZE, 0), (2.8, CHAMFER_1_SIZE), (2.8, 0), align=None)
    revolve(axis=Axis((-13.842834214, -25.977988248, 59), (0, 1, 0)), revolution_arc=180, mode=Mode.SUBTRACT)

    # Фаска2
    chamfer_2_edges = [part.edges().sort_by_distance(p)[0] for p in [
        (-25.592834214, -15.977988248, 31.75),
        (19.407165786, -15.977988248, 31.75),
        (19.407165786, -25.977988248, 31.75),
        (-25.592834214, -25.977988248, 31.75),
        (-25.592834214, -20.977988248, 63.5),
        (-3.092834214, -25.977988248, 63.5),
        (10.466566863, -15.977988248, 63.5),
        (-16.65223529, -15.977988248, 63.5),
        (0.371267401, -17.977988248, 63.5),
        (-6.556935829, -17.977988248, 63.5),
        (-3.092834214, -19.977988248, 63.5),
    ]]
    chamfer(chamfer_2_edges, length=CHAMFER_2_SIZE)

    # Скругление1
    fillet_1_edges = [part.edges().sort_by_distance(p)[0] for p in [
        (5.466566863, -15.977988248, 39.25),
        (15.466566863, -15.977988248, 39.25),
        (10.466566863, -15.977988248, 58.5),
        (10.466566863, -15.977988248, 20),
    ]]
    fillet(fillet_1_edges, radius=FILLET_1_R)

    # Скругление2
    fillet_2_edges = [part.edges().sort_by_distance(p)[0] for p in [
        (10.466566863, -25.977988248, 20),
        (10.466566863, -25.977988248, 58.5),
        (5.466566863, -25.977988248, 39.25),
        (15.466566863, -25.977988248, 39.25),
    ]]
    fillet(fillet_2_edges, radius=FILLET_2_R)

    # Эскиз13 → Вырез-Вытянуть9 (cut, through all)
    with BuildSketch(Plane(origin=(0, 0, 0), x_dir=(-1, 0, 0), z_dir=(0, 0, -1))):
        with Locations((3.092834214, -15.977988248)):
            Circle(SKETCH_13_R)
    extrude(amount=-CUT_EXTRUDE_9_DEPTH, mode=Mode.SUBTRACT)

    # Эскиз14 → Вырез-Вытянуть10 (cut)
    with BuildSketch(Plane.XY.offset(63.5)):
        Polygon((1.699173021, -15.977988248), (-0.696830597, -11.827988248), (-5.488837831, -11.827988248), (-7.884841448, -15.977988248), (-5.488837831, -20.127988248), (-0.696830597, -20.127988248), align=None)
    extrude(amount=-CUT_EXTRUDE_10_DEPTH, mode=Mode.SUBTRACT)

    # Эскиз15 → Вырез-Вытянуть11 (cut)
    with BuildSketch(Plane(origin=(0, 0, 0), x_dir=(-1, 0, 0), z_dir=(0, 0, -1))):
        with Locations((18.592834214, -21.977988248)):
            Circle(SKETCH_15_R)
        with Locations((-12.407165786, -21.977988248)):
            Circle(SKETCH_15_R)
    extrude(amount=-CUT_EXTRUDE_11_DEPTH, mode=Mode.SUBTRACT)

    # Эскиз16 → Вырез-Вытянуть12 (cut)
    with BuildSketch(Plane.XZ.offset(25.977988248)):
        with Locations((12.407165786, 10)):
            Rectangle(SKETCH_16_W, SKETCH_16_H)
        with Locations((-18.592834214, 10)):
            Rectangle(SKETCH_16_W, SKETCH_16_H)
    extrude(amount=-CUT_EXTRUDE_12_DEPTH, mode=Mode.SUBTRACT)


solid = part.part
